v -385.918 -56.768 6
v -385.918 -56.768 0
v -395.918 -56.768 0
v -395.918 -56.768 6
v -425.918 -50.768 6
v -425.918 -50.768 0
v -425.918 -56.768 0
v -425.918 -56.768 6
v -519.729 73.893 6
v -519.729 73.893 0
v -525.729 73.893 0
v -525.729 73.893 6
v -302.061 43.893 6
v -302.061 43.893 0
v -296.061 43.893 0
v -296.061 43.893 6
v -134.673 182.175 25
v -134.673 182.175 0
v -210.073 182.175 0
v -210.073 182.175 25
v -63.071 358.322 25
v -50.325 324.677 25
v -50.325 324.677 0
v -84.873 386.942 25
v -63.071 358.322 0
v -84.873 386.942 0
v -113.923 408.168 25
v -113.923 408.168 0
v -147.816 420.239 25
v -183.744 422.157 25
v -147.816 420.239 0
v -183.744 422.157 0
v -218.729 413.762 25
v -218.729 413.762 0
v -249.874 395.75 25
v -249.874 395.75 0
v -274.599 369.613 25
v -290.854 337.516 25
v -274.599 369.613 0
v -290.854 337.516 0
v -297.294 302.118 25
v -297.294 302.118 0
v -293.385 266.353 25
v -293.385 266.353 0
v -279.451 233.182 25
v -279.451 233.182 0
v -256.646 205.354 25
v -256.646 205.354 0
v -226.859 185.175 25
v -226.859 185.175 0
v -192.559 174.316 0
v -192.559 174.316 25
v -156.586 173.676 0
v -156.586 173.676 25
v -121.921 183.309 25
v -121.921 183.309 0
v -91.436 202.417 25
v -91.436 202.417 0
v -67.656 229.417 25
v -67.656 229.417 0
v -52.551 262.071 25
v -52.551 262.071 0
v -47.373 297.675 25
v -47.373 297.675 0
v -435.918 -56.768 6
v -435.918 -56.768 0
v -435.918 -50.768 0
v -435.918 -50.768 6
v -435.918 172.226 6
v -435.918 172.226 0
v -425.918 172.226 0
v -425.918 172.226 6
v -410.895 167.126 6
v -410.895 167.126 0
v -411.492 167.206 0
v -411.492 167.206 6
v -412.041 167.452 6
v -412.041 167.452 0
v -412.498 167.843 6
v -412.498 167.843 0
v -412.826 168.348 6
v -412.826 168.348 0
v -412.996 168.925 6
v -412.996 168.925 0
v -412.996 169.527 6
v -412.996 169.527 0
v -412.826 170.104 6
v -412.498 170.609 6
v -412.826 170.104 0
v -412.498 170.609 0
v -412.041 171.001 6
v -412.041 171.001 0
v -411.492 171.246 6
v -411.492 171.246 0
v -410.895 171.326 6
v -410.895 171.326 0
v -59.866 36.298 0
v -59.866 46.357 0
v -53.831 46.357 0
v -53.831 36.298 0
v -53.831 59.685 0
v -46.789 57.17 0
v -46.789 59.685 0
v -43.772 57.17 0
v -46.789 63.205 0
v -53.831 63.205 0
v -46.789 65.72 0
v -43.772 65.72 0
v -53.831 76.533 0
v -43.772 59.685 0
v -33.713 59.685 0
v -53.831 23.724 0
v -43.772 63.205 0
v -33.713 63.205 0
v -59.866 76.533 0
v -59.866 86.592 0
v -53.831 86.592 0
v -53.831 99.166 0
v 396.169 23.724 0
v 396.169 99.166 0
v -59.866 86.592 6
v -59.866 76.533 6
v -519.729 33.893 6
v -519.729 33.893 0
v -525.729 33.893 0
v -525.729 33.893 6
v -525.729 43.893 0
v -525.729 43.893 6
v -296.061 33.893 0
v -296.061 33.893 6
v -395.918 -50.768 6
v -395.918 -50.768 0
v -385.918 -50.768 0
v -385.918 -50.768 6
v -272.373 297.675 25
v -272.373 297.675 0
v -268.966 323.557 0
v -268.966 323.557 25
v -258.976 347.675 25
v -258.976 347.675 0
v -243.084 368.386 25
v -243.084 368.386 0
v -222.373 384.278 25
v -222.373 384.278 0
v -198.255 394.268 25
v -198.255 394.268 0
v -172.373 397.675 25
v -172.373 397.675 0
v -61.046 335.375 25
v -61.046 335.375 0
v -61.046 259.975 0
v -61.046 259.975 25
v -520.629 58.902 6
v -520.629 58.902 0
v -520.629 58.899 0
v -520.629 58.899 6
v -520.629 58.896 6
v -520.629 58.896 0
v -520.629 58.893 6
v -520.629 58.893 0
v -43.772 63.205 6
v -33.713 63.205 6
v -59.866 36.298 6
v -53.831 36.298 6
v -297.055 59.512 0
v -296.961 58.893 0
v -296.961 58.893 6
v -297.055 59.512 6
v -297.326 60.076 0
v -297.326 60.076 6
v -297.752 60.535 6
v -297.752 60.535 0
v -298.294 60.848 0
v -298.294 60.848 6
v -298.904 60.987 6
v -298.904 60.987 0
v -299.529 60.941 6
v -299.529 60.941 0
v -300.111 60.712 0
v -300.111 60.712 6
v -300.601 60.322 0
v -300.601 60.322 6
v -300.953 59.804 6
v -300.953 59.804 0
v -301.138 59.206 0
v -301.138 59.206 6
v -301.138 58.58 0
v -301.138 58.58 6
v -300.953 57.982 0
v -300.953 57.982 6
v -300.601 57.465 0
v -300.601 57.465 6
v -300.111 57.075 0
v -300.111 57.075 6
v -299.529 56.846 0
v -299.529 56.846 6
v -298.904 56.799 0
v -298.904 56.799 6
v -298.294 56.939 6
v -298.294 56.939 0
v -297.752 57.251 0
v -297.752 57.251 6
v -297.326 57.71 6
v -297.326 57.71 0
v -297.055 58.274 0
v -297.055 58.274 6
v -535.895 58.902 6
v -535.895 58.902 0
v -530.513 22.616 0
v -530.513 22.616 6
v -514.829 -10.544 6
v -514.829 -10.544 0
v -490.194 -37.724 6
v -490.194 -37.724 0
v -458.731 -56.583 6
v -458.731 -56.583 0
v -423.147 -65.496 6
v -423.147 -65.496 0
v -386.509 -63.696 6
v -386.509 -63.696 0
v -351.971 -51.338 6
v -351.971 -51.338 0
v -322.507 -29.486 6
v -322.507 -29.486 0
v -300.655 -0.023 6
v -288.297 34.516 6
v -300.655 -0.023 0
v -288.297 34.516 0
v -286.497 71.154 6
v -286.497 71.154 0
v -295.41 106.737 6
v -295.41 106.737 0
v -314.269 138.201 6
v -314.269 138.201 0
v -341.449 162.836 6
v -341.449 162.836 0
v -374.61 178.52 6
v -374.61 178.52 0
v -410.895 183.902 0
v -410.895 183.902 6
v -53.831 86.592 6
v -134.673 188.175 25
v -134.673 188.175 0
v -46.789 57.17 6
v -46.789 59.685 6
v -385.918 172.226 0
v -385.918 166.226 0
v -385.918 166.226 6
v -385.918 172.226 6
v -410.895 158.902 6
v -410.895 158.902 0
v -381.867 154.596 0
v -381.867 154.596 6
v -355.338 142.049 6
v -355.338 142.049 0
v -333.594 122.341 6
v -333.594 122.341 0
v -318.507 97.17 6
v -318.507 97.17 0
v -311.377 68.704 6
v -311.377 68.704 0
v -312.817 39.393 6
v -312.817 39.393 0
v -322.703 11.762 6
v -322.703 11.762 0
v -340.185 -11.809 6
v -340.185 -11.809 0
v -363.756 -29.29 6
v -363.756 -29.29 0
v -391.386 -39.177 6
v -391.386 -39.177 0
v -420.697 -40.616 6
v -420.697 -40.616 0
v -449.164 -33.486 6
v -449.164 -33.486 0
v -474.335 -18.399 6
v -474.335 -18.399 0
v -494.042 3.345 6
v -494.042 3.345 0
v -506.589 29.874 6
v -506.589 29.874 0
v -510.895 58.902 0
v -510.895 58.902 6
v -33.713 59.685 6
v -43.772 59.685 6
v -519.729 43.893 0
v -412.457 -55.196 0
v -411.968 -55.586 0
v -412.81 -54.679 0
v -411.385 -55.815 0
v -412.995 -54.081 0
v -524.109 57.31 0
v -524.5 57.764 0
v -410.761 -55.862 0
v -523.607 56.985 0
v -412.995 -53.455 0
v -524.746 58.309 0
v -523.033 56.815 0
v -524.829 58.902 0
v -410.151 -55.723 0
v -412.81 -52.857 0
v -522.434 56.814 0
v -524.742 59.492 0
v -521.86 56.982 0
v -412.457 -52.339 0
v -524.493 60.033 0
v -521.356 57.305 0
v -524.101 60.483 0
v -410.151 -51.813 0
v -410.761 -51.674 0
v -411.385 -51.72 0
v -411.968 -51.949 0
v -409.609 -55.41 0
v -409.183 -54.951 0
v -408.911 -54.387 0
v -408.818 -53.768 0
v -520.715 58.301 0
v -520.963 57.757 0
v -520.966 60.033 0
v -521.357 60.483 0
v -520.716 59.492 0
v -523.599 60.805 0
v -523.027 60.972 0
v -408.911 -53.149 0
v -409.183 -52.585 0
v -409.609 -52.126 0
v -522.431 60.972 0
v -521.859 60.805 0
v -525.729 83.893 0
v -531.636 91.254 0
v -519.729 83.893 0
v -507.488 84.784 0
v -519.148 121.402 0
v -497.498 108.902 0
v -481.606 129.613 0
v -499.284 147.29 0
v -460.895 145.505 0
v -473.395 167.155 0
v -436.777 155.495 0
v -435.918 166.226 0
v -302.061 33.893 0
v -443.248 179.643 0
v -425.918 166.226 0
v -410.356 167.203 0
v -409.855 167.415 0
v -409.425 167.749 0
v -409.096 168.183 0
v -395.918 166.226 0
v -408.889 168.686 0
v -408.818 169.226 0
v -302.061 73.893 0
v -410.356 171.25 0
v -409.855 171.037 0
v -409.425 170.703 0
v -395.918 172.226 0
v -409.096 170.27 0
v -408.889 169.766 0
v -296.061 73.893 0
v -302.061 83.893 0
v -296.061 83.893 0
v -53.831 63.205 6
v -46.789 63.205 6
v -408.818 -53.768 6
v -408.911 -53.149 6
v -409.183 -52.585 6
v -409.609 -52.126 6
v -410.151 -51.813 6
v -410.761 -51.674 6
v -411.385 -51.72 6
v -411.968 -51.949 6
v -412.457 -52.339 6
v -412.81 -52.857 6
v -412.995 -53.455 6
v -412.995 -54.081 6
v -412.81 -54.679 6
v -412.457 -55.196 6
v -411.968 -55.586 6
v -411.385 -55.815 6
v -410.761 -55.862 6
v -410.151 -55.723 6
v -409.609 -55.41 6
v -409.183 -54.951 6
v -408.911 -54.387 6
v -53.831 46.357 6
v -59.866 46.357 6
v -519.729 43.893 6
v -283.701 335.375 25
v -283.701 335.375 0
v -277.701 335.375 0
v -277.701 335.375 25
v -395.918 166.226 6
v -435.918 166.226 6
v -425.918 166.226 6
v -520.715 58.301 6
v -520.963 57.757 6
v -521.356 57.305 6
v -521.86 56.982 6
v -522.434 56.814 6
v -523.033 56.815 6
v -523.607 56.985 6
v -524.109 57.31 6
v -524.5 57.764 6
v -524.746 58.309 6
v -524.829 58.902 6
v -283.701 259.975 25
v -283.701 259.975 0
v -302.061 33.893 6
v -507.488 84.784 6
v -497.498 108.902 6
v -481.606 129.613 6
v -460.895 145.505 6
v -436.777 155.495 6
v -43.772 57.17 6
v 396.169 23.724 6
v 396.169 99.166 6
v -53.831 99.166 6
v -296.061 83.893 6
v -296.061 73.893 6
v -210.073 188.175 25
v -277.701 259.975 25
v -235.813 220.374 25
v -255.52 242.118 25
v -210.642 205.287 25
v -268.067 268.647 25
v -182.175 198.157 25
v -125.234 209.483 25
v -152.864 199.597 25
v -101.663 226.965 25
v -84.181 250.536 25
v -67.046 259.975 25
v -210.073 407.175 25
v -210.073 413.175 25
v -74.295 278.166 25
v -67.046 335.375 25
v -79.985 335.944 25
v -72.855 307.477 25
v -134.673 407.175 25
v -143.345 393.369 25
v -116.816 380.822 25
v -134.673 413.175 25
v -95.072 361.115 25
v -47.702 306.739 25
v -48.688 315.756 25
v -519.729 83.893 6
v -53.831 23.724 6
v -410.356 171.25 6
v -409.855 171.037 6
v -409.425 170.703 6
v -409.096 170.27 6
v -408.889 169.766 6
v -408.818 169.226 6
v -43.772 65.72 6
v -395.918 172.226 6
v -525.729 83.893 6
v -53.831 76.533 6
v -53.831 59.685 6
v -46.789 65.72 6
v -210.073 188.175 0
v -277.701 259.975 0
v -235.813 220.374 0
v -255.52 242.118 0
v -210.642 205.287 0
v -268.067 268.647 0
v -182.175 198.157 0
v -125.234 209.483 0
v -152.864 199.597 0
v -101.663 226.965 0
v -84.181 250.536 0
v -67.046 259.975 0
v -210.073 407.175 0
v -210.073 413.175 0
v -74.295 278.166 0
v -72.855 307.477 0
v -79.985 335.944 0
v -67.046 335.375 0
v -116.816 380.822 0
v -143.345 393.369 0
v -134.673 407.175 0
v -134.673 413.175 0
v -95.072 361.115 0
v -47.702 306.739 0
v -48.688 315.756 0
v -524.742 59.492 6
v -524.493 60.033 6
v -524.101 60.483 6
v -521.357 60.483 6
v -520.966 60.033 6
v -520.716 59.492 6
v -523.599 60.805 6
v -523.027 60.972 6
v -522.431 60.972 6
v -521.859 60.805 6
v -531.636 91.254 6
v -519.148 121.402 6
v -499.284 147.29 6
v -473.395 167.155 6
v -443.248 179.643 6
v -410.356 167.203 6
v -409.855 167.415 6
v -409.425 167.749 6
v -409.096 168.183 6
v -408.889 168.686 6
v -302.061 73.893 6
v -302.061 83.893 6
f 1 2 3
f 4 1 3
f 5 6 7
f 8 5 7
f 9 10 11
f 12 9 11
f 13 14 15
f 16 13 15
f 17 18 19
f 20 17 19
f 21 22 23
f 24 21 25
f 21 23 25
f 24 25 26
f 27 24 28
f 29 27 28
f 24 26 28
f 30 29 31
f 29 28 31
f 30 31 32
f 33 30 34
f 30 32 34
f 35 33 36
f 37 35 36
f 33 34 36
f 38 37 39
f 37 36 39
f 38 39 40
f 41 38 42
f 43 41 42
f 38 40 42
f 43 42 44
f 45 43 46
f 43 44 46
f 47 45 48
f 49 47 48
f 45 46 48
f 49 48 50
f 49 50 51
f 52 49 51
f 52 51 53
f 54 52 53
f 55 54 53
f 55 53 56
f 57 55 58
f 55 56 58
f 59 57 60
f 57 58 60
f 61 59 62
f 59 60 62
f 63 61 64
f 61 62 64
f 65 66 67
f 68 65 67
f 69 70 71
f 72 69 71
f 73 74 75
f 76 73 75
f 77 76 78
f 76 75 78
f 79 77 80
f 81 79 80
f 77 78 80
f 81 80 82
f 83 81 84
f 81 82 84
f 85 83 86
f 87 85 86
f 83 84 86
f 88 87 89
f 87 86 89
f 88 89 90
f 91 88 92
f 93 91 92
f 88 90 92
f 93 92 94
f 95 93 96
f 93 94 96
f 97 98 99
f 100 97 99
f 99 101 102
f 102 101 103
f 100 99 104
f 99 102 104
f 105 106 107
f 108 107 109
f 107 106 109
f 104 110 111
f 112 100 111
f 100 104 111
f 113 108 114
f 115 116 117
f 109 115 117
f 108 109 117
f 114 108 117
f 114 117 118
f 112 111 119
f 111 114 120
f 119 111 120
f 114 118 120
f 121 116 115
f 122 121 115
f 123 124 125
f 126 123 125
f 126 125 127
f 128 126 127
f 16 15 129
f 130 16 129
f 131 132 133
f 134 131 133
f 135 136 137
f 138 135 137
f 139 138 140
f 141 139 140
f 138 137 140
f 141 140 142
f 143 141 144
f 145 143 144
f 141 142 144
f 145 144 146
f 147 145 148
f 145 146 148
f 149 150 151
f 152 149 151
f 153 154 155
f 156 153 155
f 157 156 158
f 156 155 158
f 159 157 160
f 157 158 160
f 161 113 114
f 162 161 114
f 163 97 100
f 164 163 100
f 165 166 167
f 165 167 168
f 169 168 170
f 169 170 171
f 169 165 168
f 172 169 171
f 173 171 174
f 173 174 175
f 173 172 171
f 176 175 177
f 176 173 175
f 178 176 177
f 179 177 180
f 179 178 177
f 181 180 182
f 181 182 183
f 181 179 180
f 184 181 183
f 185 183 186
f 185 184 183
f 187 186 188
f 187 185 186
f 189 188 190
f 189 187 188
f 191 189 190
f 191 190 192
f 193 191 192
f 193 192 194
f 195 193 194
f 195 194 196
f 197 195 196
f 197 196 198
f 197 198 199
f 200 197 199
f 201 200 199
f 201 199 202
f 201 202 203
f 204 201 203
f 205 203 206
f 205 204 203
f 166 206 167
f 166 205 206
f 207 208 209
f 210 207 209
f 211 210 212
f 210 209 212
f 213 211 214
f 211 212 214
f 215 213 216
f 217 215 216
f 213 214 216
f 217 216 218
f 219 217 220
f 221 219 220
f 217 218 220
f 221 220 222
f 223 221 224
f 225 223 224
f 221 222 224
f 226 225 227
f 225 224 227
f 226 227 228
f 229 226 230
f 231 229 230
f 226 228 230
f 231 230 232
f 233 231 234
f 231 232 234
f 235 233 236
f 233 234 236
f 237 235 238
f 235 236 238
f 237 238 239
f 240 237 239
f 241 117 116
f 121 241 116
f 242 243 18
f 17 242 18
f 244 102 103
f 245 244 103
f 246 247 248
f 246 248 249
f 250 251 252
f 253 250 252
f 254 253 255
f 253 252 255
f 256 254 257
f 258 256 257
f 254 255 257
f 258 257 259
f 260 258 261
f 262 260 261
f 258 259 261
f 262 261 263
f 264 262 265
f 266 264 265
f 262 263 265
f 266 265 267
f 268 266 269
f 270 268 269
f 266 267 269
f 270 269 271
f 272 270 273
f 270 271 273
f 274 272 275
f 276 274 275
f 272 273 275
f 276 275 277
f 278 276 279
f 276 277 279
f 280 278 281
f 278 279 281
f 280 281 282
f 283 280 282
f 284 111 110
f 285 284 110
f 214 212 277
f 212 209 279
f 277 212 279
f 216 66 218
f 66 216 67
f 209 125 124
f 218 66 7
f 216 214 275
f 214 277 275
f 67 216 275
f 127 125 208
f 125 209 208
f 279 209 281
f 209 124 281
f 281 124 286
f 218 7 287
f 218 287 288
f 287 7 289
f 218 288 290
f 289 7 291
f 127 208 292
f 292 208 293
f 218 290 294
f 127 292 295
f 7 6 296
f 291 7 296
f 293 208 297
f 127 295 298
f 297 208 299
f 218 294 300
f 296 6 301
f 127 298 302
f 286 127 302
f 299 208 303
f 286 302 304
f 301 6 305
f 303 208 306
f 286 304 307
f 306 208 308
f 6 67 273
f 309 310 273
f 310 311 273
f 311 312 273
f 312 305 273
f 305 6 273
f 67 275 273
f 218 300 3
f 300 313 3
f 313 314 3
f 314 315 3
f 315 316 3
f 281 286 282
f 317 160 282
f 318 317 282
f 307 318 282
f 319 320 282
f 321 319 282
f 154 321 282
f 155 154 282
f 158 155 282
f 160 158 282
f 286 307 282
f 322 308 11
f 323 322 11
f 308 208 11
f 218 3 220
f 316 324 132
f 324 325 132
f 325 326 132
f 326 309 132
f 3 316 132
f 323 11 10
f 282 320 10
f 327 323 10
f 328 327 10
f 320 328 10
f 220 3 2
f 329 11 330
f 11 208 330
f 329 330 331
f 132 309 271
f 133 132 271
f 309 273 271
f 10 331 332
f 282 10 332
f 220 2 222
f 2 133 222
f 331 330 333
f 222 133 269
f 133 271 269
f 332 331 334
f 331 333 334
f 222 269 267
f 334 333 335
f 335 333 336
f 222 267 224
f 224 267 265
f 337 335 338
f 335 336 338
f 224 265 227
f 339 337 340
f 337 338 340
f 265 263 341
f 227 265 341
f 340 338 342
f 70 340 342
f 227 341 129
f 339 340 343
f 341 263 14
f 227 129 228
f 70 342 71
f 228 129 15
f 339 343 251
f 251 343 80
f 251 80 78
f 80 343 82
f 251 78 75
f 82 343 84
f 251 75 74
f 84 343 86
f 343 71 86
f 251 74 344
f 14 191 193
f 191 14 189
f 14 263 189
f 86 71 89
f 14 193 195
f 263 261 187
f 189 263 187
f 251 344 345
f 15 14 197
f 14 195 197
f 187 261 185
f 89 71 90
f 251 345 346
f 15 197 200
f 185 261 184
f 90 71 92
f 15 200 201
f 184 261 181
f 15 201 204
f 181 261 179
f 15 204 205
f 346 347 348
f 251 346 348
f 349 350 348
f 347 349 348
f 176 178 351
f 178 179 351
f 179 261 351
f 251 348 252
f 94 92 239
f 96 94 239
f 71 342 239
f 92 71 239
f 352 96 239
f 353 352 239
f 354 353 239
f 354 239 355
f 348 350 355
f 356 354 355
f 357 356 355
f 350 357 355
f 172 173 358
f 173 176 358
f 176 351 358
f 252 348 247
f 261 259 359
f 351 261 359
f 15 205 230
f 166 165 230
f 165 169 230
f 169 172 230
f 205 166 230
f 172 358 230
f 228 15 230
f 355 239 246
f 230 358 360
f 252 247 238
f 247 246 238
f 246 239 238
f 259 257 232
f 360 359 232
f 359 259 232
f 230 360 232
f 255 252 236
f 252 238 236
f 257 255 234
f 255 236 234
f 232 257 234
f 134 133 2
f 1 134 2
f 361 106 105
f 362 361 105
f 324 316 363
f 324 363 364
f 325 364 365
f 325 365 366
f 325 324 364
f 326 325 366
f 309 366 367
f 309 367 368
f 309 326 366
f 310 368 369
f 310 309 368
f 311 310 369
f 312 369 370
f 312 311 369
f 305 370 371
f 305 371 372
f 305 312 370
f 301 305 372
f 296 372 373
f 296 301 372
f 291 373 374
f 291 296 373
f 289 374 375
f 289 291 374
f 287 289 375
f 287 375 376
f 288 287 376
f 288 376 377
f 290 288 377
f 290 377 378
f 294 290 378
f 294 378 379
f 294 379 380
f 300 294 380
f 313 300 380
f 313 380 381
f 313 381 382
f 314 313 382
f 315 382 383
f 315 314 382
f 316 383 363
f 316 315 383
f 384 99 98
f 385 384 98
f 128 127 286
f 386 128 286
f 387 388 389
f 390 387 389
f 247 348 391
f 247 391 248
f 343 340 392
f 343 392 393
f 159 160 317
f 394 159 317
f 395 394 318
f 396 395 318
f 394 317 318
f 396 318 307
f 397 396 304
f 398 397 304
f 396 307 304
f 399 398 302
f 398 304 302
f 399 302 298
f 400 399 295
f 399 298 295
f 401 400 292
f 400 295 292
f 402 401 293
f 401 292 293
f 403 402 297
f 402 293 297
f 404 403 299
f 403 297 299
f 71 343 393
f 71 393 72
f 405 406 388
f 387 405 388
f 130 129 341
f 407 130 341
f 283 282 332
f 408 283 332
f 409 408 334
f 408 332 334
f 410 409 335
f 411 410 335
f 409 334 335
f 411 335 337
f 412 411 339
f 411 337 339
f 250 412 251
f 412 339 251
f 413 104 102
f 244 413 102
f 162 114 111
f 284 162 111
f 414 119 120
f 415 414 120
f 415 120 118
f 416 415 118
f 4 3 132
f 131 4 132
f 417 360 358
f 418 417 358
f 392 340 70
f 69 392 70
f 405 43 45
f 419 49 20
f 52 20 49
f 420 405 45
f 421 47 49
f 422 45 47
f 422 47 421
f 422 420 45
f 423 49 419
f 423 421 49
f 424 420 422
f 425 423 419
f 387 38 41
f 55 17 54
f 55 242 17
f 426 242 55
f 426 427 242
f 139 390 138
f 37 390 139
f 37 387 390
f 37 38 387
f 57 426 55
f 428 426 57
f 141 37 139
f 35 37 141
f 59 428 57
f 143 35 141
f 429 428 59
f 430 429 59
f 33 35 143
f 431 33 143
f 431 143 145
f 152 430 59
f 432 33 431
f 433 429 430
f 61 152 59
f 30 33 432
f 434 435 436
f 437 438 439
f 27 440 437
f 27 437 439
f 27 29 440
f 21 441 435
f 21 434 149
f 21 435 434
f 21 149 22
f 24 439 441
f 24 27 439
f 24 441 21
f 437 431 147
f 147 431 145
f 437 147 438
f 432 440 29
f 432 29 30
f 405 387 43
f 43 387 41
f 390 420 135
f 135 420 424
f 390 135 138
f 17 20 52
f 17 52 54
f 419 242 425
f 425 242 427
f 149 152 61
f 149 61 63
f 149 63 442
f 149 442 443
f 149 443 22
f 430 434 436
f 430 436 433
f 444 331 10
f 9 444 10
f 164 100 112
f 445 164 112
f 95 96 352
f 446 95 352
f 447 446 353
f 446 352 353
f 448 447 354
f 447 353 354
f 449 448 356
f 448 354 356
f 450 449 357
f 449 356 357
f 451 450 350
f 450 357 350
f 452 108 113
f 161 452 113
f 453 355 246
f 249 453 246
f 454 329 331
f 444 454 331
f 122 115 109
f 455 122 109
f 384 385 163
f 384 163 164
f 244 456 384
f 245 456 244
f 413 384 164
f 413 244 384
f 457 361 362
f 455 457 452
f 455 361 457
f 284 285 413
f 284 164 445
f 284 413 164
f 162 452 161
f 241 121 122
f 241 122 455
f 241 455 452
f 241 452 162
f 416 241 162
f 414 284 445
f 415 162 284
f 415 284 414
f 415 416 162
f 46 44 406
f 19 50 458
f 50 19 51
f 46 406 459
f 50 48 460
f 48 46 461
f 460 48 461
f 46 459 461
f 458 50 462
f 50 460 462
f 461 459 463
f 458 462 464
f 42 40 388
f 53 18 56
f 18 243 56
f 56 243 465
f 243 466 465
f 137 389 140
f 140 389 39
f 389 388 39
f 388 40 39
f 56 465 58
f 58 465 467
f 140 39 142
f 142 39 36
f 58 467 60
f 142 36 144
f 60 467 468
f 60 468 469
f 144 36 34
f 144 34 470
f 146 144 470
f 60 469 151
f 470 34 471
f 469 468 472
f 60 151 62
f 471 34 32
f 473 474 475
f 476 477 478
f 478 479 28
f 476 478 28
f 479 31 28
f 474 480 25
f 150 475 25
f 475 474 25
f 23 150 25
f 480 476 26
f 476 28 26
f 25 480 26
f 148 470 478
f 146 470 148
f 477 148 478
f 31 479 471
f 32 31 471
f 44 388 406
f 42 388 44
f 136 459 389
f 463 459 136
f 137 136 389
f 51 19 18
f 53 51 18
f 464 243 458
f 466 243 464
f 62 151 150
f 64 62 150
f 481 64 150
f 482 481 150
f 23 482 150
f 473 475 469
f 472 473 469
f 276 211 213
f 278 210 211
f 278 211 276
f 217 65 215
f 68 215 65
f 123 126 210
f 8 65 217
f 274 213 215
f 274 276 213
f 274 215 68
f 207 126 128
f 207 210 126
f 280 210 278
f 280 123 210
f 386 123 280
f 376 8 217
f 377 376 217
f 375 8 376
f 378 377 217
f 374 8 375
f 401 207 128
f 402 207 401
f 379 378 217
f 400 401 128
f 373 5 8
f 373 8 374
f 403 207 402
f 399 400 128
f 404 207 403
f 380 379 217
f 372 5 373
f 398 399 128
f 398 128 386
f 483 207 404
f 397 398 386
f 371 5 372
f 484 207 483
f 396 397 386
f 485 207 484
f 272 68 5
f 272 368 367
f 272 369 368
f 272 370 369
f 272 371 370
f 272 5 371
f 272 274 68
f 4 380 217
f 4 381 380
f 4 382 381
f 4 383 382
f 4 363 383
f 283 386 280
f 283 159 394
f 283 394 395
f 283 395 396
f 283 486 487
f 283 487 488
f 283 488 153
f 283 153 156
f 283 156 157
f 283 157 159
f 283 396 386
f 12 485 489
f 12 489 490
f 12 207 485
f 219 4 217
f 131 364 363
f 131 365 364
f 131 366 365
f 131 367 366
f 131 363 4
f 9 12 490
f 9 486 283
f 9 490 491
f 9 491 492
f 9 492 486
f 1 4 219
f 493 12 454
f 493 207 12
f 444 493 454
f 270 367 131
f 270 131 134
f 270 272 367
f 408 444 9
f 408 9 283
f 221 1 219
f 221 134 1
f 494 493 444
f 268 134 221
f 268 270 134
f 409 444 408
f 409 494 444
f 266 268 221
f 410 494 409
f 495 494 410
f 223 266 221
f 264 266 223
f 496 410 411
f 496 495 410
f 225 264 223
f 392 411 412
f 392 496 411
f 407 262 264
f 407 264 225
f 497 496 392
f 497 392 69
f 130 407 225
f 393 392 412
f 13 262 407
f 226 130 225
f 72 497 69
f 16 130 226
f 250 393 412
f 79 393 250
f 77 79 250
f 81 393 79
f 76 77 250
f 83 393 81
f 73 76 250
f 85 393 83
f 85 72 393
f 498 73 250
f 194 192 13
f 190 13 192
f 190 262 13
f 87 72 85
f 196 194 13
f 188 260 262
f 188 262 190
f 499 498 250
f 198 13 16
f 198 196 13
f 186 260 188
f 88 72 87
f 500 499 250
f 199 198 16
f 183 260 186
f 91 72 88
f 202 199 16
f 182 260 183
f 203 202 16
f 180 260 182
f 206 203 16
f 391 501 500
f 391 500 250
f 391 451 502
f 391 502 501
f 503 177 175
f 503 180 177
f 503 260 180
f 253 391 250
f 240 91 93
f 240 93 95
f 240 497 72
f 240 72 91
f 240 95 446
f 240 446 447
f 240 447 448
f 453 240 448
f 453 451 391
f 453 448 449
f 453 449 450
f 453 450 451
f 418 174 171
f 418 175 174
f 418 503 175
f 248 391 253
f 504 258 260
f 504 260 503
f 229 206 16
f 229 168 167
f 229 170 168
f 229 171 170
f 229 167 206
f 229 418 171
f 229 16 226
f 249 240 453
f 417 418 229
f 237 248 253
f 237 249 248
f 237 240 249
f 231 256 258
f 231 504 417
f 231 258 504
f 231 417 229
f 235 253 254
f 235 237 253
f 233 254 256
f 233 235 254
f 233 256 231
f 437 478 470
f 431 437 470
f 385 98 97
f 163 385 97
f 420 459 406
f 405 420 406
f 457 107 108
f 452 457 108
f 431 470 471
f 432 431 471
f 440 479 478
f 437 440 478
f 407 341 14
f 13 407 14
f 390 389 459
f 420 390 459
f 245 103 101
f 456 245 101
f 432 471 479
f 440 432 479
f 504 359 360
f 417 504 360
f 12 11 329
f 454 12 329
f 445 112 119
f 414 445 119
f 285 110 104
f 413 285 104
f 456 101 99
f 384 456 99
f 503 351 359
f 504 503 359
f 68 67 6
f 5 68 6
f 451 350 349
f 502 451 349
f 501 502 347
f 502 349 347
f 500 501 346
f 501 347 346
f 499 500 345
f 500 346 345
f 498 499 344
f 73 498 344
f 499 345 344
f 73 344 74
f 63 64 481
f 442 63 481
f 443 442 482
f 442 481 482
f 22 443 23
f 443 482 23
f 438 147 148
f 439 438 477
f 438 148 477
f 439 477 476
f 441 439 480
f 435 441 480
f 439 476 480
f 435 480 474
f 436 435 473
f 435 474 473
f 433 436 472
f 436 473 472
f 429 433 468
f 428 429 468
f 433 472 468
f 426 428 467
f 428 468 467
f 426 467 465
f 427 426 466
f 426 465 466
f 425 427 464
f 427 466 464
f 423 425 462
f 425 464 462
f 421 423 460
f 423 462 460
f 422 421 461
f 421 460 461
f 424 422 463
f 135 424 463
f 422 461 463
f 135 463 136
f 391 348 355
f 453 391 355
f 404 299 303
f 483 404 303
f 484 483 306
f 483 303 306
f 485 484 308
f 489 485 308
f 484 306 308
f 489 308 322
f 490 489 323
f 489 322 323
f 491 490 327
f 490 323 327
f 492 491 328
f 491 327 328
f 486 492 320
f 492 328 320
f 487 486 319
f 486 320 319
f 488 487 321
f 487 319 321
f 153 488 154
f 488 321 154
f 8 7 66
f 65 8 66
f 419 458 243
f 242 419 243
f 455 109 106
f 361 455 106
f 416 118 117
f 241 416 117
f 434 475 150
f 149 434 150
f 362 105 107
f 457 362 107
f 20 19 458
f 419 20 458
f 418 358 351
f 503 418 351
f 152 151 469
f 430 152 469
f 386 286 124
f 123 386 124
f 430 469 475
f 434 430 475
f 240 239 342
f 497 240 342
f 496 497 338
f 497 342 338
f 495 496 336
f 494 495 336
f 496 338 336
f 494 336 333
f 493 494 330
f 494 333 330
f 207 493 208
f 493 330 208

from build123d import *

# Parameters (mm, degrees)
F1_DEPTH = 6
F2_R     = 2.1
F2_W     = 10
F2_H     = 6
F3_DEPTH = 6
F4_DEPTH = 25
F6_DEPTH = 25


with BuildPart() as f1:
    # F0 (on Top) → F1 (new body)
    with BuildSketch(Plane.XY):
        Polygon((279.1693404089, 99.1658887499), (-53.8306595911, 99.1658887499), (-53.8306595911, 86.5923102222), (-59.8659772844, 86.5923102222), (-59.8659772844, 76.5334474001), (-53.8306595911, 76.5334474001), (-53.8306595911, 63.2054541607), (-46.7894556156, 63.2054541607), (-46.7894556156, 65.7201698663), (-43.7717967689, 65.7201698663), (-43.7717967689, 63.2054541607), (-33.7129339468, 63.2054541607), (-33.7129339468, 59.684852173), (-43.7717967689, 59.684852173), (-43.7717967689, 57.1701364674), (-46.7894556156, 57.1701364674), (-46.7894556156, 59.684852173), (-53.8306595911, 59.684852173), (-53.8306595911, 46.3568589336), (-59.8659772844, 46.3568589336), (-59.8659772844, 36.2979961115), (-53.8306595911, 36.2979961115), (-53.8306595911, 23.7244175838), (279.1693404089, 23.7244175838), (396.1693404089, 23.7244175838), (396.1693404089, 99.1658887499), align=None)
    extrude(amount=F1_DEPTH)

    # F2 (on Top) → F4 (cut)
    with BuildSketch(Plane.XY):
        with BuildLine():
            ThreePointArc((-535.8952581882, 58.9019991457), (-410.8952581882, -66.0980008543), (-285.8952581882, 58.9019991457))
            ThreePointArc((-285.8952581882, 58.9019991457), (-322.5069105399, 147.2903467941), (-410.8952581882, 183.9019991457))
            Line((-410.8952581882, 183.9019991457), (-410.8952581882, 171.3260555502))
            ThreePointArc((-410.8952581882, 171.3260555502), (-409.4250397969, 170.7030497302), (-408.8179735184, 169.2261784077))
            ThreePointArc((-408.8179735184, 169.2261784077), (-409.4250397969, 167.7493070851), (-410.8952581882, 167.1263012651))
            Line((-410.8952581882, 167.1263012651), (-410.8952581882, 158.9019991457))
            ThreePointArc((-410.8952581882, 158.9019991457), (-340.1845800696, 129.6126772644), (-310.8952581882, 58.9019991457))
            ThreePointArc((-310.8952581882, 58.9019991457), (-410.8952581882, -41.0980008543), (-510.8952581882, 58.9019991457))
            Line((-510.8952581882, 58.9019991457), (-520.629256827, 58.9019991457))
            ThreePointArc((-520.629256827, 58.9019991457), (-520.629243447, 58.8976711127), (-520.629238987, 58.8933430612))
            ThreePointArc((-520.629238987, 58.8933430612), (-522.7335670384, 56.7933475212), (-524.8292211469, 58.9019991457))
            Line((-524.8292211469, 58.9019991457), (-535.8952581882, 58.9019991457))
        make_face()
        Polygon((-435.9179735184, -50.7677718997), (-430.9179735184, -50.7677718997), (-425.9179735184, -50.7677718997), (-425.9179735184, -53.7677718997), (-425.9179735184, -56.7677718997), (-430.9179735184, -56.7677718997), (-435.9179735184, -56.7677718997), (-435.9179735184, -53.7677718997), align=None, mode=Mode.SUBTRACT)
        with Locations((-410.9179735184, -53.7677718997)):
            Circle(F2_R, mode=Mode.SUBTRACT)
        Polygon((-519.729238987, 43.8933430612), (-519.729238987, 38.8933430612), (-519.729238987, 33.8933430612), (-522.729238987, 33.8933430612), (-525.729238987, 33.8933430612), (-525.729238987, 38.8933430612), (-525.729238987, 43.8933430612), (-522.729238987, 43.8933430612), align=None, mode=Mode.SUBTRACT)
        Polygon((-395.9179735184, -56.7677718997), (-395.9179735184, -53.7677718997), (-395.9179735184, -50.7677718997), (-390.9179735184, -50.7677718997), (-385.9179735184, -50.7677718997), (-385.9179735184, -53.7677718997), (-385.9179735184, -56.7677718997), (-390.9179735184, -56.7677718997), align=None, mode=Mode.SUBTRACT)
        Polygon((-296.0612773895, 33.8933430612), (-299.0612773895, 33.8933430612), (-302.0612773895, 33.8933430612), (-302.0612773895, 38.8933430612), (-302.0612773895, 43.8933430612), (-299.0612773895, 43.8933430612), (-296.0612773895, 43.8933430612), (-296.0612773895, 38.8933430612), align=None, mode=Mode.SUBTRACT)
        with Locations((-299.0612773895, 58.8933430612)):
            Circle(F2_R, mode=Mode.SUBTRACT)
        Polygon((-296.0612773895, 73.8933430612), (-299.0612773895, 73.8933430612), (-302.0612773895, 73.8933430612), (-302.0612773895, 78.8933430612), (-302.0612773895, 83.8933430612), (-299.0612773895, 83.8933430612), (-296.0612773895, 83.8933430612), (-296.0612773895, 78.8933430612), align=None, mode=Mode.SUBTRACT)
        with Locations((-390.9179735184, 169.2261784077)):
            Rectangle(F2_W, F2_H, mode=Mode.SUBTRACT)
        with BuildLine():
            Line((-410.8952581882, 171.3260555502), (-410.8952581882, 183.9019991457))
            ThreePointArc((-410.8952581882, 183.9019991457), (-499.2836058366, 147.2903467941), (-535.8952581882, 58.9019991457))
            Line((-535.8952581882, 58.9019991457), (-524.8292211469, 58.9019991457))
            ThreePointArc((-524.8292211469, 58.9019991457), (-522.729238987, 60.9933430612), (-520.629256827, 58.9019991457))
            Line((-520.629256827, 58.9019991457), (-510.8952581882, 58.9019991457))
            ThreePointArc((-510.8952581882, 58.9019991457), (-481.6059363069, 129.6126772644), (-410.8952581882, 158.9019991457))
            Line((-410.8952581882, 158.9019991457), (-410.8952581882, 167.1263012651))
            ThreePointArc((-410.8952581882, 167.1263012651), (-413.0179735184, 169.2261784077), (-410.8952581882, 171.3260555502))
        make_face()
        Polygon((-519.729238987, 73.8933430612), (-522.729238987, 73.8933430612), (-525.729238987, 73.8933430612), (-525.729238987, 78.8933430612), (-525.729238987, 83.8933430612), (-522.729238987, 83.8933430612), (-519.729238987, 83.8933430612), (-519.729238987, 78.8933430612), align=None, mode=Mode.SUBTRACT)
        with Locations((-430.9179735184, 169.2261784077)):
            Rectangle(F2_W, F2_H, mode=Mode.SUBTRACT)
    extrude(amount=-F4_DEPTH, mode=Mode.SUBTRACT)


with BuildPart() as f3:
    # F2 (on Top) → F3 (new body)
    with BuildSketch(Plane.XY):
        with BuildLine():
            ThreePointArc((-535.8952581882, 58.9019991457), (-410.8952581882, -66.0980008543), (-285.8952581882, 58.9019991457))
            ThreePointArc((-285.8952581882, 58.9019991457), (-322.5069105399, 147.2903467941), (-410.8952581882, 183.9019991457))
            Line((-410.8952581882, 183.9019991457), (-410.8952581882, 171.3260555502))
            ThreePointArc((-410.8952581882, 171.3260555502), (-409.4250397969, 170.7030497302), (-408.8179735184, 169.2261784077))
            ThreePointArc((-408.8179735184, 169.2261784077), (-409.4250397969, 167.7493070851), (-410.8952581882, 167.1263012651))
            Line((-410.8952581882, 167.1263012651), (-410.8952581882, 158.9019991457))
            ThreePointArc((-410.8952581882, 158.9019991457), (-340.1845800696, 129.6126772644), (-310.8952581882, 58.9019991457))
            ThreePointArc((-310.8952581882, 58.9019991457), (-410.8952581882, -41.0980008543), (-510.8952581882, 58.9019991457))
            Line((-510.8952581882, 58.9019991457), (-520.629256827, 58.9019991457))
            ThreePointArc((-520.629256827, 58.9019991457), (-520.629243447, 58.8976711127), (-520.629238987, 58.8933430612))
            ThreePointArc((-520.629238987, 58.8933430612), (-522.7335670384, 56.7933475212), (-524.8292211469, 58.9019991457))
            Line((-524.8292211469, 58.9019991457), (-535.8952581882, 58.9019991457))
        make_face()
        Polygon((-435.9179735184, -50.7677718997), (-430.9179735184, -50.7677718997), (-425.9179735184, -50.7677718997), (-425.9179735184, -53.7677718997), (-425.9179735184, -56.7677718997), (-430.9179735184, -56.7677718997), (-435.9179735184, -56.7677718997), (-435.9179735184, -53.7677718997), align=None, mode=Mode.SUBTRACT)
        with Locations((-410.9179735184, -53.7677718997)):
            Circle(F2_R, mode=Mode.SUBTRACT)
        Polygon((-519.729238987, 43.8933430612), (-519.729238987, 38.8933430612), (-519.729238987, 33.8933430612), (-522.729238987, 33.8933430612), (-525.729238987, 33.8933430612), (-525.729238987, 38.8933430612), (-525.729238987, 43.8933430612), (-522.729238987, 43.8933430612), align=None, mode=Mode.SUBTRACT)
        Polygon((-395.9179735184, -56.7677718997), (-395.9179735184, -53.7677718997), (-395.9179735184, -50.7677718997), (-390.9179735184, -50.7677718997), (-385.9179735184, -50.7677718997), (-385.9179735184, -53.7677718997), (-385.9179735184, -56.7677718997), (-390.9179735184, -56.7677718997), align=None, mode=Mode.SUBTRACT)
        Polygon((-296.0612773895, 33.8933430612), (-299.0612773895, 33.8933430612), (-302.0612773895, 33.8933430612), (-302.0612773895, 38.8933430612), (-302.0612773895, 43.8933430612), (-299.0612773895, 43.8933430612), (-296.0612773895, 43.8933430612), (-296.0612773895, 38.8933430612), align=None, mode=Mode.SUBTRACT)
        with Locations((-299.0612773895, 58.8933430612)):
            Circle(F2_R, mode=Mode.SUBTRACT)
        Polygon((-296.0612773895, 73.8933430612), (-299.0612773895, 73.8933430612), (-302.0612773895, 73.8933430612), (-302.0612773895, 78.8933430612), (-302.0612773895, 83.8933430612), (-299.0612773895, 83.8933430612), (-296.0612773895, 83.8933430612), (-296.0612773895, 78.8933430612), align=None, mode=Mode.SUBTRACT)
        with Locations((-390.9179735184, 169.2261784077)):
            Rectangle(F2_W, F2_H, mode=Mode.SUBTRACT)
        with BuildLine():
            Line((-410.8952581882, 171.3260555502), (-410.8952581882, 183.9019991457))
            ThreePointArc((-410.8952581882, 183.9019991457), (-499.2836058366, 147.2903467941), (-535.8952581882, 58.9019991457))
            Line((-535.8952581882, 58.9019991457), (-524.8292211469, 58.9019991457))
            ThreePointArc((-524.8292211469, 58.9019991457), (-522.729238987, 60.9933430612), (-520.629256827, 58.9019991457))
            Line((-520.629256827, 58.9019991457), (-510.8952581882, 58.9019991457))
            ThreePointArc((-510.8952581882, 58.9019991457), (-481.6059363069, 129.6126772644), (-410.8952581882, 158.9019991457))
            Line((-410.8952581882, 158.9019991457), (-410.8952581882, 167.1263012651))
            ThreePointArc((-410.8952581882, 167.1263012651), (-413.0179735184, 169.2261784077), (-410.8952581882, 171.3260555502))
        make_face()
        Polygon((-519.729238987, 73.8933430612), (-522.729238987, 73.8933430612), (-525.729238987, 73.8933430612), (-525.729238987, 78.8933430612), (-525.729238987, 83.8933430612), (-522.729238987, 83.8933430612), (-519.729238987, 83.8933430612), (-519.729238987, 78.8933430612), align=None, mode=Mode.SUBTRACT)
        with Locations((-430.9179735184, 169.2261784077)):
            Rectangle(F2_W, F2_H, mode=Mode.SUBTRACT)
    extrude(amount=F3_DEPTH)


with BuildPart() as f6:
    # F5 (on Top) → F6 (new body)
    with BuildSketch(Plane.XY):
        with BuildLine():
            Line((-61.0462027192, 297.6752446951), (-47.3733710892, 297.6752446951))
            ThreePointArc((-47.3733710892, 297.6752446951), (-48.1133448219, 311.256329779), (-50.3245050421, 324.6766205232))
            ThreePointArc((-50.3245050421, 324.6766205232), (-94.1115412438, 395.1436292578), (-172.3733710892, 422.6752446951))
            Line((-172.3733710892, 422.6752446951), (-172.3733710892, 413.1752446951))
            Line((-172.3733710892, 413.1752446951), (-134.6733710892, 413.1752446951))
            Line((-134.6733710892, 413.1752446951), (-134.6733710892, 410.1752446951))
            Line((-134.6733710892, 410.1752446951), (-134.6733710892, 407.1752446951))
            Line((-134.6733710892, 407.1752446951), (-172.3733710892, 407.1752446951))
            Line((-172.3733710892, 407.1752446951), (-172.3733710892, 397.6752446951))
            ThreePointArc((-172.3733710892, 397.6752446951), (-101.6626929706, 368.3859228138), (-72.3733710892, 297.6752446951))
            Line((-72.3733710892, 297.6752446951), (-67.0462027192, 297.6752446951))
            Line((-67.0462027192, 297.6752446951), (-67.0462027192, 335.3752446951))
            Line((-67.0462027192, 335.3752446951), (-61.0462027192, 335.3752446951))
            Line((-61.0462027192, 335.3752446951), (-61.0462027192, 297.6752446951))
        make_face()
        with BuildLine():
            ThreePointArc((-297.3733710892, 297.6752446951), (-172.3733710892, 172.6752446951), (-47.3733710892, 297.6752446951))
            Line((-47.3733710892, 297.6752446951), (-61.0462027192, 297.6752446951))
            Line((-61.0462027192, 297.6752446951), (-61.0462027192, 259.9752446951))
            Line((-61.0462027192, 259.9752446951), (-67.0462027192, 259.9752446951))
            Line((-67.0462027192, 259.9752446951), (-67.0462027192, 297.6752446951))
            Line((-67.0462027192, 297.6752446951), (-72.3733710892, 297.6752446951))
            ThreePointArc((-72.3733710892, 297.6752446951), (-172.3733710892, 197.6752446951), (-272.3733710892, 297.6752446951))
            Line((-272.3733710892, 297.6752446951), (-277.7005394592, 297.6752446951))
            Line((-277.7005394592, 297.6752446951), (-277.7005394592, 259.9752446951))
            Line((-277.7005394592, 259.9752446951), (-283.7005394592, 259.9752446951))
            Line((-283.7005394592, 259.9752446951), (-283.7005394592, 297.6752446951))
            Line((-283.7005394592, 297.6752446951), (-297.3733710892, 297.6752446951))
        make_face()
        Polygon((-134.6733710892, 185.1752446951), (-134.6733710892, 182.1752446951), (-172.3733710892, 182.1752446951), (-210.0733710892, 182.1752446951), (-210.0733710892, 185.1752446951), (-210.0733710892, 188.1752446951), (-172.3733710892, 188.1752446951), (-134.6733710892, 188.1752446951), align=None, mode=Mode.SUBTRACT)
        with BuildLine():
            ThreePointArc((-172.3733710892, 422.6752446951), (-260.7617187375, 386.0635923434), (-297.3733710892, 297.6752446951))
            Line((-297.3733710892, 297.6752446951), (-283.7005394592, 297.6752446951))
            Line((-283.7005394592, 297.6752446951), (-283.7005394592, 335.3752446951))
            Line((-283.7005394592, 335.3752446951), (-277.7005394592, 335.3752446951))
            Line((-277.7005394592, 335.3752446951), (-277.7005394592, 297.6752446951))
            Line((-277.7005394592, 297.6752446951), (-272.3733710892, 297.6752446951))
            ThreePointArc((-272.3733710892, 297.6752446951), (-243.0840492079, 368.3859228138), (-172.3733710892, 397.6752446951))
            Line((-172.3733710892, 397.6752446951), (-172.3733710892, 407.1752446951))
            Line((-172.3733710892, 407.1752446951), (-210.0733710892, 407.1752446951))
            Line((-210.0733710892, 407.1752446951), (-210.0733710892, 410.1752446951))
            Line((-210.0733710892, 410.1752446951), (-210.0733710892, 413.1752446951))
            Line((-210.0733710892, 413.1752446951), (-172.3733710892, 413.1752446951))
            Line((-172.3733710892, 413.1752446951), (-172.3733710892, 422.6752446951))
        make_face()
    extrude(amount=F6_DEPTH)


solid = Compound([f1.part, f3.part, f6.part])
